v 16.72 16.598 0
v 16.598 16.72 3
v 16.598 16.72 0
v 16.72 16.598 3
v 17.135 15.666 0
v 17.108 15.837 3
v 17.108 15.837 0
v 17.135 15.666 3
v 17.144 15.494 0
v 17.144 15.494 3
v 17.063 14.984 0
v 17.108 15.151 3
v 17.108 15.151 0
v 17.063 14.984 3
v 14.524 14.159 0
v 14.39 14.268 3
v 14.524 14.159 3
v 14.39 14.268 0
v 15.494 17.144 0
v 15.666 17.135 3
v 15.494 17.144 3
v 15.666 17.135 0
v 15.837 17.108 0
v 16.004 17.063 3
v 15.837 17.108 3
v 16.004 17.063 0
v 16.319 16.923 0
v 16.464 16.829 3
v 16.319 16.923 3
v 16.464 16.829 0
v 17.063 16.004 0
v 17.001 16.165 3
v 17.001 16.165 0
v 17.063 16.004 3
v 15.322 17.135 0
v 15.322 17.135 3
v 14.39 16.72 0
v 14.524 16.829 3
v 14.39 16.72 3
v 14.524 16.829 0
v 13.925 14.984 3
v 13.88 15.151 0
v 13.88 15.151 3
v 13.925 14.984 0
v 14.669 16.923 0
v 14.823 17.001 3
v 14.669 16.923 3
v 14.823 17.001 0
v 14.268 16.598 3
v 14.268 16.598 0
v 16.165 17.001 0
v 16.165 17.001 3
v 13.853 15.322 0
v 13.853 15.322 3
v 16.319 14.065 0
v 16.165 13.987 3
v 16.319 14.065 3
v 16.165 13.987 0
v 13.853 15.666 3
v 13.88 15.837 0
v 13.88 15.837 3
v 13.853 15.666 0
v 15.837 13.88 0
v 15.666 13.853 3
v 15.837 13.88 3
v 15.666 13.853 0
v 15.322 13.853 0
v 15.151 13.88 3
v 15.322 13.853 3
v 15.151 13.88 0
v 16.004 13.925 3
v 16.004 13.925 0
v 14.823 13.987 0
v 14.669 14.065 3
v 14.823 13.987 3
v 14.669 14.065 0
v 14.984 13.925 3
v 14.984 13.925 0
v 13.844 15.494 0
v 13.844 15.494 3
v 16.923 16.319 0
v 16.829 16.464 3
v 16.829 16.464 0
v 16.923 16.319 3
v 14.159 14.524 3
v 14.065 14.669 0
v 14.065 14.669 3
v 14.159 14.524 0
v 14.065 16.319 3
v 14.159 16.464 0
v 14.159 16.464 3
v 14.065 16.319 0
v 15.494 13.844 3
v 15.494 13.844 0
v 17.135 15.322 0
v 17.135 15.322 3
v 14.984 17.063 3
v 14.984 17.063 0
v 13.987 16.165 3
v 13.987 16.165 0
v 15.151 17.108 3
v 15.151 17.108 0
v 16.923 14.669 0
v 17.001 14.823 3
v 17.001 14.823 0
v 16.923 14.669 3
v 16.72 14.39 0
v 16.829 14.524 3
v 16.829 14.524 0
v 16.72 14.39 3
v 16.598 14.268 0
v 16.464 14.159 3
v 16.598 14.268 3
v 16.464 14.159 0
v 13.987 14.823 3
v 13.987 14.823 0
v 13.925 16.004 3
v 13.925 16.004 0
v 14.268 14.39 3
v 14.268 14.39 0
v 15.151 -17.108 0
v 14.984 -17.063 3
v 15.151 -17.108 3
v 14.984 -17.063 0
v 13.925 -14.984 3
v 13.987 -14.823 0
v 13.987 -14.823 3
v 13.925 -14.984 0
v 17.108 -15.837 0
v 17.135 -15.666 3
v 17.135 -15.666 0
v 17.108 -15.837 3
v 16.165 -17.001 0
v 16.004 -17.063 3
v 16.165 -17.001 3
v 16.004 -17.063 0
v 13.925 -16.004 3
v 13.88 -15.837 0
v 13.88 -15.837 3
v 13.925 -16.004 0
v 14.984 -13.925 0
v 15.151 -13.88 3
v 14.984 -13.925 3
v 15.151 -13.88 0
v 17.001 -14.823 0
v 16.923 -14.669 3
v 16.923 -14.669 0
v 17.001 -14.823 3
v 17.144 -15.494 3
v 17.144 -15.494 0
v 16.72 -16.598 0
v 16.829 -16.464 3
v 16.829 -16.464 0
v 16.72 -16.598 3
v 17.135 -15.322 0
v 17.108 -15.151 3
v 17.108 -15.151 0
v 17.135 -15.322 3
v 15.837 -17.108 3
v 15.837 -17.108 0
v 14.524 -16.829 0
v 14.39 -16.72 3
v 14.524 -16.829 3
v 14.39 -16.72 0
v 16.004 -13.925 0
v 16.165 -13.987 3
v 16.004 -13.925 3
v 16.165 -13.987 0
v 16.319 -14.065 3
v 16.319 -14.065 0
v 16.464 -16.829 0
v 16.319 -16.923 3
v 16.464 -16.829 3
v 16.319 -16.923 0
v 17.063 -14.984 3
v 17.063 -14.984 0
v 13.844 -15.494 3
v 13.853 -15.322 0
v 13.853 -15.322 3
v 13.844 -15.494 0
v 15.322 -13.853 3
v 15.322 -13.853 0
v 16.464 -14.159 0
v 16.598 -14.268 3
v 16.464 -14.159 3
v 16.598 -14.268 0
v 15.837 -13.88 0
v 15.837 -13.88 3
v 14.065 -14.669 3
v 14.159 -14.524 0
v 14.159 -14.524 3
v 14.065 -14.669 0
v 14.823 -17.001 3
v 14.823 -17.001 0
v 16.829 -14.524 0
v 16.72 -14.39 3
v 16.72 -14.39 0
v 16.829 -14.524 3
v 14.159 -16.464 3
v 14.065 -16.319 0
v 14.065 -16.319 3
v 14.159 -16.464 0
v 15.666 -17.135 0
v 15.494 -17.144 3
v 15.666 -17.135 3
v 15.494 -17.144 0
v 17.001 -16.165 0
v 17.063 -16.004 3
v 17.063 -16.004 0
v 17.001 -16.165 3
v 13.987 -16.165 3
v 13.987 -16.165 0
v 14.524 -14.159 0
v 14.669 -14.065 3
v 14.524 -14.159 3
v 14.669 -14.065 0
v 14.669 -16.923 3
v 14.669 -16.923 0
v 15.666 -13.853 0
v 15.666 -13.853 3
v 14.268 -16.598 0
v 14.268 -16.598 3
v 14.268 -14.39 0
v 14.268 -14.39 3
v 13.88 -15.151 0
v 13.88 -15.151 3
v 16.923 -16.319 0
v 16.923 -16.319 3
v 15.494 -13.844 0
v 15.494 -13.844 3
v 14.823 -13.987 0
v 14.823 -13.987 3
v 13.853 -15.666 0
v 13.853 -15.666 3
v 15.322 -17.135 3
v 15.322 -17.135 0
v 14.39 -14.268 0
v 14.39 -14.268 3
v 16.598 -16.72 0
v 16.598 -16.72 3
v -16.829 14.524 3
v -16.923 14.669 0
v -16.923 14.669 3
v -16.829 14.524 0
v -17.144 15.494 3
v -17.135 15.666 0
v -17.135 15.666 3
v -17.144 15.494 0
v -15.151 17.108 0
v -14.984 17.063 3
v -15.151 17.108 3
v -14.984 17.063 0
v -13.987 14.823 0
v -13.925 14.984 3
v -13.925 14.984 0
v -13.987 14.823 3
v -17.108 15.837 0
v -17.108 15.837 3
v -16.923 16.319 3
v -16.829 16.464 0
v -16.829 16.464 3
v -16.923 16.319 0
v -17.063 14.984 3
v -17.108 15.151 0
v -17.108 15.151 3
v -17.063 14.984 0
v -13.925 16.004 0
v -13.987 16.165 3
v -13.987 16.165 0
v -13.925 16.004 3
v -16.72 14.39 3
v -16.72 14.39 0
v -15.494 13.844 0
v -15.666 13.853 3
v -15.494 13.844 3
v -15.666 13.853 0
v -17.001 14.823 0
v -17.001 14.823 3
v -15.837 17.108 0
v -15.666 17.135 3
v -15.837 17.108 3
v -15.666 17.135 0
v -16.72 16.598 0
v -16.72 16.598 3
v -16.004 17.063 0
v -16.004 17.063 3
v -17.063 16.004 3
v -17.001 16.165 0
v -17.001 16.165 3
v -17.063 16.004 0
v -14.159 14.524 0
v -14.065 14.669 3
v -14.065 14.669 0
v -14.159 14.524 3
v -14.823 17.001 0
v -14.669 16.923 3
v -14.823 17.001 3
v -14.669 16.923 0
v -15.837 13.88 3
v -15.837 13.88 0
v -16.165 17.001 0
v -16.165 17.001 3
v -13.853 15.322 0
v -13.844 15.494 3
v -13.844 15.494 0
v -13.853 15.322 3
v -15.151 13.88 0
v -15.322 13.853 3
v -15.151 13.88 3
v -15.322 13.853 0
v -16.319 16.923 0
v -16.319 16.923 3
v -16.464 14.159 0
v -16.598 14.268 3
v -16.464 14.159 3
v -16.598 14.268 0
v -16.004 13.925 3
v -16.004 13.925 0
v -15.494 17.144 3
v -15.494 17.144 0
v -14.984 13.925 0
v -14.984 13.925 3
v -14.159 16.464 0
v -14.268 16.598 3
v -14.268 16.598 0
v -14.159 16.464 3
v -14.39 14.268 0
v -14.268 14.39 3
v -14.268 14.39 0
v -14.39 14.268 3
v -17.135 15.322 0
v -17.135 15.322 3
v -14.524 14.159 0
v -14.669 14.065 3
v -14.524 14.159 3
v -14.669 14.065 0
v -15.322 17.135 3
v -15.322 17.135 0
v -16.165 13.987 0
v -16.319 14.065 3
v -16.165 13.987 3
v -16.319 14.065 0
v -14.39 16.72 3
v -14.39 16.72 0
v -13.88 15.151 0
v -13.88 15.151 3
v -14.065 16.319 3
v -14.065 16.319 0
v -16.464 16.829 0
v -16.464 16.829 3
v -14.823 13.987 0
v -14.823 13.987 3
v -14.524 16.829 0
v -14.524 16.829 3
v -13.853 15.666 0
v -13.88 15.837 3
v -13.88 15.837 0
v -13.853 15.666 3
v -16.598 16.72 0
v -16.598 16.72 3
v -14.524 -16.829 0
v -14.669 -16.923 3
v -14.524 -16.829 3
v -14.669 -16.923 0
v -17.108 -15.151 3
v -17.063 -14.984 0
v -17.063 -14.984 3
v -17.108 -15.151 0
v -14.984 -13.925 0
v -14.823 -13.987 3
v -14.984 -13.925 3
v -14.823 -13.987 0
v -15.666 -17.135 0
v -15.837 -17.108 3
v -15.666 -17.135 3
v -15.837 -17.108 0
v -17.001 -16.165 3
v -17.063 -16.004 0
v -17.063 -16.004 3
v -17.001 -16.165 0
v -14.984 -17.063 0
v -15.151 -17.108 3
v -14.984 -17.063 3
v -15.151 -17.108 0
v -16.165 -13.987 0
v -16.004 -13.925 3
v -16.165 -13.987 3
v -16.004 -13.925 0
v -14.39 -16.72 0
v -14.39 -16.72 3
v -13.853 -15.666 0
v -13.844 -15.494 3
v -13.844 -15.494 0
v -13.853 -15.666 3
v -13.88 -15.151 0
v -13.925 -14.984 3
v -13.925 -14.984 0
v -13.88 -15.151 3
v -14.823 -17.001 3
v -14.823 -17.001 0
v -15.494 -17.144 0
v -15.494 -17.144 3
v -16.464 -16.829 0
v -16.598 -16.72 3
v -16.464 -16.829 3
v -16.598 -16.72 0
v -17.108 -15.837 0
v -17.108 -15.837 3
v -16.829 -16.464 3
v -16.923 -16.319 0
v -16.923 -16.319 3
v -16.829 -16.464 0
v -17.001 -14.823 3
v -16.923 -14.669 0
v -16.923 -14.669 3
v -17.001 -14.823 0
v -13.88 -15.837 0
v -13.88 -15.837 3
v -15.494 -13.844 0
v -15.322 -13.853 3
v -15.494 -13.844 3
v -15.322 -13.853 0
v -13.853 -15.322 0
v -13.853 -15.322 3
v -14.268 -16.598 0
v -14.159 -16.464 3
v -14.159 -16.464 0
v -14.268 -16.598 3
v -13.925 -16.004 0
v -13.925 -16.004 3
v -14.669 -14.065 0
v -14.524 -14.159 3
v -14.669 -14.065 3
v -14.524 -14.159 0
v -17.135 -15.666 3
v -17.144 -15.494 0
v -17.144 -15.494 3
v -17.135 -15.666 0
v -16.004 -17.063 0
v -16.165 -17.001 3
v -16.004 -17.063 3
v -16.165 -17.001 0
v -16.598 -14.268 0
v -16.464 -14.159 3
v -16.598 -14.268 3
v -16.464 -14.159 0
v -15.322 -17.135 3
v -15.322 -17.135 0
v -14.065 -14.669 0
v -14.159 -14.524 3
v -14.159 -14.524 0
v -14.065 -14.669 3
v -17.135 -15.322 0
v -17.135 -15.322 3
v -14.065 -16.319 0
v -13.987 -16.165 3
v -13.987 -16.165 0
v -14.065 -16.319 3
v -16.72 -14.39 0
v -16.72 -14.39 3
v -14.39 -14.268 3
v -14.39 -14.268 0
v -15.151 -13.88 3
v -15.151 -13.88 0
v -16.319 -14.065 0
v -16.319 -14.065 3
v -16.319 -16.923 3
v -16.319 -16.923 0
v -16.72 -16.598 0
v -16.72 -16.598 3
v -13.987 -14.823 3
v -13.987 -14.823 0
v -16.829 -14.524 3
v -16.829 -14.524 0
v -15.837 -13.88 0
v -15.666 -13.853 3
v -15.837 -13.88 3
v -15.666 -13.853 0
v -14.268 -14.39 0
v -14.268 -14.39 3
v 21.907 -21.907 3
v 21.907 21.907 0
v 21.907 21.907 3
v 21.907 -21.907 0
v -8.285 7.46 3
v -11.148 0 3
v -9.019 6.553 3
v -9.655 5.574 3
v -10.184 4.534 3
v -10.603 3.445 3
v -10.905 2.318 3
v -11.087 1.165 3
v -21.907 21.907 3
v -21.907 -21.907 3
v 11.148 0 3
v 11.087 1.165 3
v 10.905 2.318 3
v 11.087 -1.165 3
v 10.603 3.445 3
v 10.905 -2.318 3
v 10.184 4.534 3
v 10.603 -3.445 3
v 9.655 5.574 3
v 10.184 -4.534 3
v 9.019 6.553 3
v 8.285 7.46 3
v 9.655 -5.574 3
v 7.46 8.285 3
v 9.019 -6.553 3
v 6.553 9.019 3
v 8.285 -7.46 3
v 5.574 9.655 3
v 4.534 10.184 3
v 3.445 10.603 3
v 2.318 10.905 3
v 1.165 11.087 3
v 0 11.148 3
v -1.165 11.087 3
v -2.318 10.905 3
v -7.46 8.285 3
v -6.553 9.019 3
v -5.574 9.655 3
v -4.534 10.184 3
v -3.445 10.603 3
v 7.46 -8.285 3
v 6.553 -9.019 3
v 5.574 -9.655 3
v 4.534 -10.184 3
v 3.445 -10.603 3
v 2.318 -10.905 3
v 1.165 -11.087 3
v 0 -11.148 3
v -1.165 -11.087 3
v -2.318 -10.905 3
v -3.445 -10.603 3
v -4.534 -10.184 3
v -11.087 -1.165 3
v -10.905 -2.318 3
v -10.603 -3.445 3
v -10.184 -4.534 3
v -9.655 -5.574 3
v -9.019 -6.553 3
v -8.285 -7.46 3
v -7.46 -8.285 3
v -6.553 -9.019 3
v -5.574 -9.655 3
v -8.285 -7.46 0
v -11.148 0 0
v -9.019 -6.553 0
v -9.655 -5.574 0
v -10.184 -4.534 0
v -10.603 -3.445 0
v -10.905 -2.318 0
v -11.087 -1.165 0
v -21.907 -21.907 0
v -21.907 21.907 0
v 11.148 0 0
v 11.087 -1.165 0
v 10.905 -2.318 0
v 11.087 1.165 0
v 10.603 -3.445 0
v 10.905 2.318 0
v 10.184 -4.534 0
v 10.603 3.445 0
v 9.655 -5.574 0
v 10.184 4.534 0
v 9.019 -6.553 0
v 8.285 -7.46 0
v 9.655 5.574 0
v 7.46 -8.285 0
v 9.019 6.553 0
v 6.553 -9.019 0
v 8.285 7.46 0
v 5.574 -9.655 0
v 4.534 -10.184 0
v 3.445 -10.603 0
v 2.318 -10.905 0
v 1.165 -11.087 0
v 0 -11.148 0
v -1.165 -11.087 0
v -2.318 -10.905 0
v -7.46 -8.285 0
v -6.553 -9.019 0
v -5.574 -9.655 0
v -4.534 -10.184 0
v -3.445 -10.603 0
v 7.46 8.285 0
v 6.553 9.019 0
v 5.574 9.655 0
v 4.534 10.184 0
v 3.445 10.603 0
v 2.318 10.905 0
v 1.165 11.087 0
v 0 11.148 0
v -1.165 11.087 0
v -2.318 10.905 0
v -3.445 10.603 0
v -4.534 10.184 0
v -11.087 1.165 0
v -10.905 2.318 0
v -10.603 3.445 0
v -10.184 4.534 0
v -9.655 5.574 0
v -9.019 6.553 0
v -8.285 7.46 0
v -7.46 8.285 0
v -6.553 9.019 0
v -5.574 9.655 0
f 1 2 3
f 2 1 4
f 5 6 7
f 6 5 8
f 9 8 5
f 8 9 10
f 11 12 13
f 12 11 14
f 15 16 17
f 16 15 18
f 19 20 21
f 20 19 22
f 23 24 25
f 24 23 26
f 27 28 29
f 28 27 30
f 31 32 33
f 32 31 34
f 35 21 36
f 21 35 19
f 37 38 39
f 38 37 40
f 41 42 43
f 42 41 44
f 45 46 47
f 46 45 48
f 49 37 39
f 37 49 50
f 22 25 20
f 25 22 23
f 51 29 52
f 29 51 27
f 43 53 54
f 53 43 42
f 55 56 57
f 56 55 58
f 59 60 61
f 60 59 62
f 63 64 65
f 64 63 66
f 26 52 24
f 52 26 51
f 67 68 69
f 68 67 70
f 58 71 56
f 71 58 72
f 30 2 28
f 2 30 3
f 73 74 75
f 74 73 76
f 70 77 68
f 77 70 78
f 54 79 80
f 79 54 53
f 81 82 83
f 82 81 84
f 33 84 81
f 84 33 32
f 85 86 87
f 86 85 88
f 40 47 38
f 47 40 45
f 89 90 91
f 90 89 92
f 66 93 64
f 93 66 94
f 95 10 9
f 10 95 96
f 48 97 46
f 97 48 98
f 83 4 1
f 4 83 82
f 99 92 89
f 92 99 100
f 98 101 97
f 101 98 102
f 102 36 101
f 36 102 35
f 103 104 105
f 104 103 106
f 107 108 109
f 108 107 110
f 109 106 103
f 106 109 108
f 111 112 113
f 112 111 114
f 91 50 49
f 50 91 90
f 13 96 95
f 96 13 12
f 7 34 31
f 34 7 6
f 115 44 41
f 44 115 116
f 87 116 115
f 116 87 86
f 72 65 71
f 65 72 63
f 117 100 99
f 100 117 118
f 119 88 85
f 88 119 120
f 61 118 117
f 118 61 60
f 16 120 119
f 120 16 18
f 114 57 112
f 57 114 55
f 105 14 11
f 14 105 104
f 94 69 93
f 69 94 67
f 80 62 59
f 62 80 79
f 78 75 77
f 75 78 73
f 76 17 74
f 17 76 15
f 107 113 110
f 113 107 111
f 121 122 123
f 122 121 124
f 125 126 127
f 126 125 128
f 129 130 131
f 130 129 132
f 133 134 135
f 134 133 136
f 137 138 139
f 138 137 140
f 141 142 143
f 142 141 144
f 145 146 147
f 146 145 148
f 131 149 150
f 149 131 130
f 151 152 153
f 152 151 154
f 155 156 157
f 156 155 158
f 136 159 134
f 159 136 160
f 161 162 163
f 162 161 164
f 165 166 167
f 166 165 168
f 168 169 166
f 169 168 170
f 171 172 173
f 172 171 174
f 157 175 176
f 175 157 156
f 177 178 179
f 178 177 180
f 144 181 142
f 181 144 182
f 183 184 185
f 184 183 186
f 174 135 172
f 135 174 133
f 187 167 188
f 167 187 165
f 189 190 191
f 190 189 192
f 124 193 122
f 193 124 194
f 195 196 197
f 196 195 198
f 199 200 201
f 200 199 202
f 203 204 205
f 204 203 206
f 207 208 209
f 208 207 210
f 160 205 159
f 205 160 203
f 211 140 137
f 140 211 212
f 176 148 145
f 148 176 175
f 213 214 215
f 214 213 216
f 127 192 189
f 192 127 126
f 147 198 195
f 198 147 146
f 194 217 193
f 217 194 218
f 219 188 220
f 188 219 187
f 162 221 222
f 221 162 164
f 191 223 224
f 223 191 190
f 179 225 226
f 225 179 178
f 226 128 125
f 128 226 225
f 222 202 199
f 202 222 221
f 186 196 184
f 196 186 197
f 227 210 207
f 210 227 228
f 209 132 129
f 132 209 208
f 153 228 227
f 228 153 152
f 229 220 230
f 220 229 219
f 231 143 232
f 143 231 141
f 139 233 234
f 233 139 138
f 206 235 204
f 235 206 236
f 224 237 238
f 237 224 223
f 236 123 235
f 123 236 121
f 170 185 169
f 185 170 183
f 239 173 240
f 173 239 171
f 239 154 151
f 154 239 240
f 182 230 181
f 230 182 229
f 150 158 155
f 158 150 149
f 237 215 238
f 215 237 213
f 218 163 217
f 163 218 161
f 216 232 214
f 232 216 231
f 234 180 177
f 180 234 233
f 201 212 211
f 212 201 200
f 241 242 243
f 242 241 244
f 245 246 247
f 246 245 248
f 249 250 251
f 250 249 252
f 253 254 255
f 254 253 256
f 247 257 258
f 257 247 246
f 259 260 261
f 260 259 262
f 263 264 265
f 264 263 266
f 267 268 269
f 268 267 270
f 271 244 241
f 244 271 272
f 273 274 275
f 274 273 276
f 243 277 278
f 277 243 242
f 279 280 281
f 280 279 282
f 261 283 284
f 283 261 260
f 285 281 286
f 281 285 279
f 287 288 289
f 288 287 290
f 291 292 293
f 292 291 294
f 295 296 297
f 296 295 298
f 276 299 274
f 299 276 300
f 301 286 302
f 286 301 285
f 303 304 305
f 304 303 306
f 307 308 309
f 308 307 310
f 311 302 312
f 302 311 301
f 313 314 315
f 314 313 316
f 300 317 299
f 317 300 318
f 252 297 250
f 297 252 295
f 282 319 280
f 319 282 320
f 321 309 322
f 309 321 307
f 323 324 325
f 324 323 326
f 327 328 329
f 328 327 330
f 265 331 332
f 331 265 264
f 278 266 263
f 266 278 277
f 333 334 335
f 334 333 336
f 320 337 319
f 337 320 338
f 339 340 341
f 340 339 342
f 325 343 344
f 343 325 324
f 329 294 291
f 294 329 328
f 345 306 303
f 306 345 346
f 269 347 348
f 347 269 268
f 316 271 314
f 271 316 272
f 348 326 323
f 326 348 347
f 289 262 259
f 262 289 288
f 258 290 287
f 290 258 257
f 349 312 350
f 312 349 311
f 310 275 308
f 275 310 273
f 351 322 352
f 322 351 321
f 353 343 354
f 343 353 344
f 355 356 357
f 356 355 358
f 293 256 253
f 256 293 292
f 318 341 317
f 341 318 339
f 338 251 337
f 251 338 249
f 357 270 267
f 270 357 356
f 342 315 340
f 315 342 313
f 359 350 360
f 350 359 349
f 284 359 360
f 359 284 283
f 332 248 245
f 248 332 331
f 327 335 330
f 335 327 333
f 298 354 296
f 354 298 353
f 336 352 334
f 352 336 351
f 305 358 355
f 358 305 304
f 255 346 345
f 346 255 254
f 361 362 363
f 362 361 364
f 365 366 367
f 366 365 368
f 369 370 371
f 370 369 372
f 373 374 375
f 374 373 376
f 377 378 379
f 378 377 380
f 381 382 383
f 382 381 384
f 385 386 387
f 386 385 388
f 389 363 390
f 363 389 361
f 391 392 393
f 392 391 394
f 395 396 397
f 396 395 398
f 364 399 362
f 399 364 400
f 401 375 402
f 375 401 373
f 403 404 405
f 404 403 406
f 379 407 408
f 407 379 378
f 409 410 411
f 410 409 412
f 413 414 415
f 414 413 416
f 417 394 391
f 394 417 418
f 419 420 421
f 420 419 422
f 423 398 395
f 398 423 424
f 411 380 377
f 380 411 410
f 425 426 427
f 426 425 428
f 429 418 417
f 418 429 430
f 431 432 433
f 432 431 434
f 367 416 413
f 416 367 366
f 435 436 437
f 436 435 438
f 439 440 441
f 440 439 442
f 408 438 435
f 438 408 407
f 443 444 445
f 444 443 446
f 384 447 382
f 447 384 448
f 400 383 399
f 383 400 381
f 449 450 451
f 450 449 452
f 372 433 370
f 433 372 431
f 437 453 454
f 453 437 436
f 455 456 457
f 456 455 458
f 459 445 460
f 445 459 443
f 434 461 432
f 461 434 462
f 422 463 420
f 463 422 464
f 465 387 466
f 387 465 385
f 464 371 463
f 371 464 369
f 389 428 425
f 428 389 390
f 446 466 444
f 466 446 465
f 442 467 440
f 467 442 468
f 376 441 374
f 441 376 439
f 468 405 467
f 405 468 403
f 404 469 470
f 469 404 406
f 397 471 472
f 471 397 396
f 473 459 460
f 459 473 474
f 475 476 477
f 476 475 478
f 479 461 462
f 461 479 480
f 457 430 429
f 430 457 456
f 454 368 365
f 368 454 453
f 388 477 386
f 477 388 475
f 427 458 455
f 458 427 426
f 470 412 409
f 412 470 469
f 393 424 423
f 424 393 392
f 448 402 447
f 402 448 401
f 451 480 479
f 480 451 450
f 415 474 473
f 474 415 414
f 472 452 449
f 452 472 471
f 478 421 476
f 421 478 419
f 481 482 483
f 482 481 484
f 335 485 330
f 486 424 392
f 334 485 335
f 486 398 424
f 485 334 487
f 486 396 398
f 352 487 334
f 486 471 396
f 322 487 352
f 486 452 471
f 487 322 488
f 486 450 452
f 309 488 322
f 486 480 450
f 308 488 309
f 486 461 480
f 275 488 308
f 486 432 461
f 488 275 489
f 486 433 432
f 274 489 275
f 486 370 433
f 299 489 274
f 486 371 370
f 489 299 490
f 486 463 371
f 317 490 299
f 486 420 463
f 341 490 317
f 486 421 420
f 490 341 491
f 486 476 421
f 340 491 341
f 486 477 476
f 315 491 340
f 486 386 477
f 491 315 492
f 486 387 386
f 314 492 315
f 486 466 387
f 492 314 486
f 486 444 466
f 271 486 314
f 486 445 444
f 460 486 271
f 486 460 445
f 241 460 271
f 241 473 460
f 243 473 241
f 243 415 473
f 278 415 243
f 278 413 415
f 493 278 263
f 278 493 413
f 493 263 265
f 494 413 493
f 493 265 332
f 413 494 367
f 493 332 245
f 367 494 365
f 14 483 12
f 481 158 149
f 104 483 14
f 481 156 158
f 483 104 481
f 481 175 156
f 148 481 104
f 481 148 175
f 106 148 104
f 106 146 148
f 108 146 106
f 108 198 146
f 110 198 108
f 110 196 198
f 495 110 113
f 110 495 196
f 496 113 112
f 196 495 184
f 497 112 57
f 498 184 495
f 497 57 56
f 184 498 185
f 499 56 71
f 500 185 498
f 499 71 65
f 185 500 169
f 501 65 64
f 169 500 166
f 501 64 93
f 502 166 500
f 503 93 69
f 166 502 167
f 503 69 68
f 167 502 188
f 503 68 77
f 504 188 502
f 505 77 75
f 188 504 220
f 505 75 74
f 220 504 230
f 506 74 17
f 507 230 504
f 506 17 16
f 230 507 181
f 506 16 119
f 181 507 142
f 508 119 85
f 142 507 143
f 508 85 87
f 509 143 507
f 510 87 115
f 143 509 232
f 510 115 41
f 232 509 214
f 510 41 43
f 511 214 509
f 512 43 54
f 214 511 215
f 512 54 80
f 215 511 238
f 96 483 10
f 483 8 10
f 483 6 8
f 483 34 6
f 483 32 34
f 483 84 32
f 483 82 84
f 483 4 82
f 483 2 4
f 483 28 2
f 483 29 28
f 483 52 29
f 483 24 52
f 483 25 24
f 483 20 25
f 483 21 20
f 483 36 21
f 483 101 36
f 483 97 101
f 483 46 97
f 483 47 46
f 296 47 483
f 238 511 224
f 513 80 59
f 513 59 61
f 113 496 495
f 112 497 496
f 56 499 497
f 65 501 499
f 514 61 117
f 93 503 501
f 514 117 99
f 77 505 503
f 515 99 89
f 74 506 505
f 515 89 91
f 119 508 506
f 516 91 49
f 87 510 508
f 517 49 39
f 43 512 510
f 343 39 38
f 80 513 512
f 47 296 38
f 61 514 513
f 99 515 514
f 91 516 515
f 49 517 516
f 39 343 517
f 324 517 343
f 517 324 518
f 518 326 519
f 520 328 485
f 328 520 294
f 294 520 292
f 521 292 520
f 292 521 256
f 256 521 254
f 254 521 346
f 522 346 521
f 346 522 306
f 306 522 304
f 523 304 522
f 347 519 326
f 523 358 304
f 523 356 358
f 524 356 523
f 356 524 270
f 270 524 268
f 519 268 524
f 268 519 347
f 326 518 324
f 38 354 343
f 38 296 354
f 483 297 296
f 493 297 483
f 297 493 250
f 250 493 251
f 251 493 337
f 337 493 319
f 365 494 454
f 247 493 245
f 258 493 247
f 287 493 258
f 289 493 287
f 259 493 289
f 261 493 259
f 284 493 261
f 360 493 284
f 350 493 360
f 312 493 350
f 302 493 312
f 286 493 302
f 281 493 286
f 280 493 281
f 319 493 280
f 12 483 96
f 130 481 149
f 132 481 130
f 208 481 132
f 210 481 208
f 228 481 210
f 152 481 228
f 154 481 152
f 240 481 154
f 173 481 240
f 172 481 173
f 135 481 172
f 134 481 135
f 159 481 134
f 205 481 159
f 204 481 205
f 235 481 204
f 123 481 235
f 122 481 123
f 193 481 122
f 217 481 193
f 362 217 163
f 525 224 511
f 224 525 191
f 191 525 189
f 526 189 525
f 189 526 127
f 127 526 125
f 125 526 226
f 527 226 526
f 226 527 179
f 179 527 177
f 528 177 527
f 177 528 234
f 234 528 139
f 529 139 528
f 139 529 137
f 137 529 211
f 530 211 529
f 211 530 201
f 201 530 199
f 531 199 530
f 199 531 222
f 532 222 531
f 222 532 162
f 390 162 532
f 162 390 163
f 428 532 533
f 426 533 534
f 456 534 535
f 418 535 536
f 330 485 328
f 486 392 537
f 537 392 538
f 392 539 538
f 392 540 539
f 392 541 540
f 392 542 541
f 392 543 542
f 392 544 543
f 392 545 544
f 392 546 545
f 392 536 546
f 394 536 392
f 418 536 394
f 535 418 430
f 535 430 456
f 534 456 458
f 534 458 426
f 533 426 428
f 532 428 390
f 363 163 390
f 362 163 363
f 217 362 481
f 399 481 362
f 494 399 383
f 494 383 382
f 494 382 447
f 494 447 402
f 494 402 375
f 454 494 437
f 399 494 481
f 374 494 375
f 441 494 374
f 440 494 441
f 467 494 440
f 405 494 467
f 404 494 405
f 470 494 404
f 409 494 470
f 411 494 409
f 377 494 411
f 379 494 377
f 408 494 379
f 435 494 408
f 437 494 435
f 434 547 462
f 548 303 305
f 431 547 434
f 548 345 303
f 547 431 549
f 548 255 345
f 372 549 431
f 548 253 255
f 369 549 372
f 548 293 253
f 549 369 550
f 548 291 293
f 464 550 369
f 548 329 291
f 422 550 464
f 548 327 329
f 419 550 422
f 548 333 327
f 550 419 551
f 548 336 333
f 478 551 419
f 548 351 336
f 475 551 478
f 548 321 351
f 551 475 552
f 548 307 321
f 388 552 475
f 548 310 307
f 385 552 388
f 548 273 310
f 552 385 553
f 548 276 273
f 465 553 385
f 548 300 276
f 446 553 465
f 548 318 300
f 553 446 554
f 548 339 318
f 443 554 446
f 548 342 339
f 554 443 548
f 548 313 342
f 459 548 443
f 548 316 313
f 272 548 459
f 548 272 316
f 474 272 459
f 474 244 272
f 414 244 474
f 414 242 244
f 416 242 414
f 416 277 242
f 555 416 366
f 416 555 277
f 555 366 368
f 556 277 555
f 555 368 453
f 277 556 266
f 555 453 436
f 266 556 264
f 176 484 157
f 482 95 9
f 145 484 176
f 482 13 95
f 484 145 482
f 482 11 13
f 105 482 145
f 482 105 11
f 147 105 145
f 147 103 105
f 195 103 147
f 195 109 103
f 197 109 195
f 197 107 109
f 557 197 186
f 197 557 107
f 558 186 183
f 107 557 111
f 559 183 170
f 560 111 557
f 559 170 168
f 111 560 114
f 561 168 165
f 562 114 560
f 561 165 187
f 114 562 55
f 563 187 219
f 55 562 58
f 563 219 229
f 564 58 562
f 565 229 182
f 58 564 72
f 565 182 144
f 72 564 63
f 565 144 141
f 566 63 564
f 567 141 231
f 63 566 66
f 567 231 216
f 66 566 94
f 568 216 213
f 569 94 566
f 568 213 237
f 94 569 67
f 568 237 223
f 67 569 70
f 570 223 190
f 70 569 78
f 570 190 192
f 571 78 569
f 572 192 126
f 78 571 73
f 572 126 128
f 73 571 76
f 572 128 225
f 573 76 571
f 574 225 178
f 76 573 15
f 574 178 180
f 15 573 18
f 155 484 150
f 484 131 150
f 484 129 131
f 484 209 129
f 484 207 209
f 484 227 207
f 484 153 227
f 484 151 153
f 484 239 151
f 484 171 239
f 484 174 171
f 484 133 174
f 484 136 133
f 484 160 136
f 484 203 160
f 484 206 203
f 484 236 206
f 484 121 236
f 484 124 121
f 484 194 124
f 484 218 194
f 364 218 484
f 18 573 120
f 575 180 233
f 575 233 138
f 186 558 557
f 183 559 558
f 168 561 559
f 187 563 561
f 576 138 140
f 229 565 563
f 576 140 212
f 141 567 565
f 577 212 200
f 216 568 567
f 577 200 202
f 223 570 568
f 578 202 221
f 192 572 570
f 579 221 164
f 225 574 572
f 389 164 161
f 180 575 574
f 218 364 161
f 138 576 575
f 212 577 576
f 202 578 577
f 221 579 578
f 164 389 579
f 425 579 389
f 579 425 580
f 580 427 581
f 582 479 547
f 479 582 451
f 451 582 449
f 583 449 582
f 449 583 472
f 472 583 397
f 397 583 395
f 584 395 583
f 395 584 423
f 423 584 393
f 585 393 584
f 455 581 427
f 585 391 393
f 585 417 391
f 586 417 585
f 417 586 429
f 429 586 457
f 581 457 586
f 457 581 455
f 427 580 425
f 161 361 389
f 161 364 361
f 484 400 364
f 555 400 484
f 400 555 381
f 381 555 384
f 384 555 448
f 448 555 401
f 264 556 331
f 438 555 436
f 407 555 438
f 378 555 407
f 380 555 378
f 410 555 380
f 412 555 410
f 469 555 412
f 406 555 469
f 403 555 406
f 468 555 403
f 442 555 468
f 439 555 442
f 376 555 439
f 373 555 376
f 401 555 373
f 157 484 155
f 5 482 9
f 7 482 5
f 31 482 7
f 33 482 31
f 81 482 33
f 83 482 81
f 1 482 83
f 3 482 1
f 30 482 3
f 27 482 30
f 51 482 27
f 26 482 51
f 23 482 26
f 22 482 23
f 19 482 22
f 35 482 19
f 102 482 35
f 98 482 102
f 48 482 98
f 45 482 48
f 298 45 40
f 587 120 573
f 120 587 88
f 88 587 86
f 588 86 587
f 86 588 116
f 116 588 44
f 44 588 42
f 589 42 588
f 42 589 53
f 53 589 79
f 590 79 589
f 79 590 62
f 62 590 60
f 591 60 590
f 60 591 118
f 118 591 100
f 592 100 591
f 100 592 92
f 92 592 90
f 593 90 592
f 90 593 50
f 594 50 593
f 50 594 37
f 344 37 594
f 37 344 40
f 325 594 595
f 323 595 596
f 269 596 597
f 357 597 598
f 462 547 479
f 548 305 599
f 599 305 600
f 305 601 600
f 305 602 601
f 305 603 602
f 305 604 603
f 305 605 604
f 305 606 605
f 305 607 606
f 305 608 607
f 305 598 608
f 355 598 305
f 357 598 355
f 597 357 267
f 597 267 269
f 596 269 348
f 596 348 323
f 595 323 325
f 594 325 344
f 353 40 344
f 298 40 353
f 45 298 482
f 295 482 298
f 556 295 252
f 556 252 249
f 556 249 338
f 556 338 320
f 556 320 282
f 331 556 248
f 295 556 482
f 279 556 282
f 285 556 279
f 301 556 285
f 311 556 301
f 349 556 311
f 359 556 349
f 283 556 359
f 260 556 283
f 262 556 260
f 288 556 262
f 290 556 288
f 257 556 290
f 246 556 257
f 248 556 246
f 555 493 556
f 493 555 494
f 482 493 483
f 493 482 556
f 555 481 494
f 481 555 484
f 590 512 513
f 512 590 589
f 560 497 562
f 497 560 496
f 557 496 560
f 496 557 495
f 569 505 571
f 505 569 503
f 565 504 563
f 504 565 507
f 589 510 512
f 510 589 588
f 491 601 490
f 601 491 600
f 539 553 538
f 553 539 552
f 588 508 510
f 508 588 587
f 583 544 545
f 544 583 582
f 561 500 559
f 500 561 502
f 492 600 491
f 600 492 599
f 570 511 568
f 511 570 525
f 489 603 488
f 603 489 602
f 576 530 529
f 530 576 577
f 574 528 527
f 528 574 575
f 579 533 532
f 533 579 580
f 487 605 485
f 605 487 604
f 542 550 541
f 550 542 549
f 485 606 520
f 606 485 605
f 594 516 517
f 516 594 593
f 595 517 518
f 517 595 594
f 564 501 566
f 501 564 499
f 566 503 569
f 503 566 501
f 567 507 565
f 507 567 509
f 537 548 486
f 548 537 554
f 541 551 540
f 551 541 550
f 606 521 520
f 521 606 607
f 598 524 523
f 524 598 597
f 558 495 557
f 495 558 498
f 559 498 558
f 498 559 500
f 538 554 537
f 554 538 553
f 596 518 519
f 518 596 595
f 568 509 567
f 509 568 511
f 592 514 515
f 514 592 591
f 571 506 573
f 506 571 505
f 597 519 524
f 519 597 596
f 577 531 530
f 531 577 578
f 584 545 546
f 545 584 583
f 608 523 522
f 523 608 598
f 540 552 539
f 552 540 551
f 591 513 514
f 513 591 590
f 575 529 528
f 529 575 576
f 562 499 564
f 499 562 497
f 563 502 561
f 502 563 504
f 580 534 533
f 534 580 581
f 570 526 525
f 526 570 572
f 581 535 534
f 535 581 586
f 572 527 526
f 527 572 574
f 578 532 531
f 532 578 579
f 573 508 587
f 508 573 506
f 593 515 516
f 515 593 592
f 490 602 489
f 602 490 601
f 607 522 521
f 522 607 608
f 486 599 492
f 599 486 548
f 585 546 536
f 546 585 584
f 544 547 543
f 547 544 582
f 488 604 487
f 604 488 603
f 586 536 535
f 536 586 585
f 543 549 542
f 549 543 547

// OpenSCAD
// Tumbling Machine - Motor Hub
// Copyright (C) 2018, Uri Shaked
// License: MIT

include <MCAD/units.scad>

$fn = 60;

mountWidth = 1.725 * inch;
mountThickness = 3;
pilotRadius = 0.433 * inch;
mountHoleDistance = 1.220 * inch;
mountHoleRadius = 1.5;
tolerance = 0.15;

module Nema17Mount() {
    difference() {
        translate([-mountWidth / 2, -mountWidth / 2, 0])
        cube([mountWidth, mountWidth, mountThickness]);

        translate([0,0,-0.05])
        cylinder(r=pilotRadius+tolerance, h=mountThickness + 0.1);

        // Motor mounting holes
        for (x=[0,1]) for (y=[0,1])
            mirror([x,y,0])
            translate([mountHoleDistance / 2, mountHoleDistance / 2,-0.05])
            cylinder(r=mountHoleRadius + tolerance,h = mountThickness + 0.1);
    }
}

Nema17Mount();
